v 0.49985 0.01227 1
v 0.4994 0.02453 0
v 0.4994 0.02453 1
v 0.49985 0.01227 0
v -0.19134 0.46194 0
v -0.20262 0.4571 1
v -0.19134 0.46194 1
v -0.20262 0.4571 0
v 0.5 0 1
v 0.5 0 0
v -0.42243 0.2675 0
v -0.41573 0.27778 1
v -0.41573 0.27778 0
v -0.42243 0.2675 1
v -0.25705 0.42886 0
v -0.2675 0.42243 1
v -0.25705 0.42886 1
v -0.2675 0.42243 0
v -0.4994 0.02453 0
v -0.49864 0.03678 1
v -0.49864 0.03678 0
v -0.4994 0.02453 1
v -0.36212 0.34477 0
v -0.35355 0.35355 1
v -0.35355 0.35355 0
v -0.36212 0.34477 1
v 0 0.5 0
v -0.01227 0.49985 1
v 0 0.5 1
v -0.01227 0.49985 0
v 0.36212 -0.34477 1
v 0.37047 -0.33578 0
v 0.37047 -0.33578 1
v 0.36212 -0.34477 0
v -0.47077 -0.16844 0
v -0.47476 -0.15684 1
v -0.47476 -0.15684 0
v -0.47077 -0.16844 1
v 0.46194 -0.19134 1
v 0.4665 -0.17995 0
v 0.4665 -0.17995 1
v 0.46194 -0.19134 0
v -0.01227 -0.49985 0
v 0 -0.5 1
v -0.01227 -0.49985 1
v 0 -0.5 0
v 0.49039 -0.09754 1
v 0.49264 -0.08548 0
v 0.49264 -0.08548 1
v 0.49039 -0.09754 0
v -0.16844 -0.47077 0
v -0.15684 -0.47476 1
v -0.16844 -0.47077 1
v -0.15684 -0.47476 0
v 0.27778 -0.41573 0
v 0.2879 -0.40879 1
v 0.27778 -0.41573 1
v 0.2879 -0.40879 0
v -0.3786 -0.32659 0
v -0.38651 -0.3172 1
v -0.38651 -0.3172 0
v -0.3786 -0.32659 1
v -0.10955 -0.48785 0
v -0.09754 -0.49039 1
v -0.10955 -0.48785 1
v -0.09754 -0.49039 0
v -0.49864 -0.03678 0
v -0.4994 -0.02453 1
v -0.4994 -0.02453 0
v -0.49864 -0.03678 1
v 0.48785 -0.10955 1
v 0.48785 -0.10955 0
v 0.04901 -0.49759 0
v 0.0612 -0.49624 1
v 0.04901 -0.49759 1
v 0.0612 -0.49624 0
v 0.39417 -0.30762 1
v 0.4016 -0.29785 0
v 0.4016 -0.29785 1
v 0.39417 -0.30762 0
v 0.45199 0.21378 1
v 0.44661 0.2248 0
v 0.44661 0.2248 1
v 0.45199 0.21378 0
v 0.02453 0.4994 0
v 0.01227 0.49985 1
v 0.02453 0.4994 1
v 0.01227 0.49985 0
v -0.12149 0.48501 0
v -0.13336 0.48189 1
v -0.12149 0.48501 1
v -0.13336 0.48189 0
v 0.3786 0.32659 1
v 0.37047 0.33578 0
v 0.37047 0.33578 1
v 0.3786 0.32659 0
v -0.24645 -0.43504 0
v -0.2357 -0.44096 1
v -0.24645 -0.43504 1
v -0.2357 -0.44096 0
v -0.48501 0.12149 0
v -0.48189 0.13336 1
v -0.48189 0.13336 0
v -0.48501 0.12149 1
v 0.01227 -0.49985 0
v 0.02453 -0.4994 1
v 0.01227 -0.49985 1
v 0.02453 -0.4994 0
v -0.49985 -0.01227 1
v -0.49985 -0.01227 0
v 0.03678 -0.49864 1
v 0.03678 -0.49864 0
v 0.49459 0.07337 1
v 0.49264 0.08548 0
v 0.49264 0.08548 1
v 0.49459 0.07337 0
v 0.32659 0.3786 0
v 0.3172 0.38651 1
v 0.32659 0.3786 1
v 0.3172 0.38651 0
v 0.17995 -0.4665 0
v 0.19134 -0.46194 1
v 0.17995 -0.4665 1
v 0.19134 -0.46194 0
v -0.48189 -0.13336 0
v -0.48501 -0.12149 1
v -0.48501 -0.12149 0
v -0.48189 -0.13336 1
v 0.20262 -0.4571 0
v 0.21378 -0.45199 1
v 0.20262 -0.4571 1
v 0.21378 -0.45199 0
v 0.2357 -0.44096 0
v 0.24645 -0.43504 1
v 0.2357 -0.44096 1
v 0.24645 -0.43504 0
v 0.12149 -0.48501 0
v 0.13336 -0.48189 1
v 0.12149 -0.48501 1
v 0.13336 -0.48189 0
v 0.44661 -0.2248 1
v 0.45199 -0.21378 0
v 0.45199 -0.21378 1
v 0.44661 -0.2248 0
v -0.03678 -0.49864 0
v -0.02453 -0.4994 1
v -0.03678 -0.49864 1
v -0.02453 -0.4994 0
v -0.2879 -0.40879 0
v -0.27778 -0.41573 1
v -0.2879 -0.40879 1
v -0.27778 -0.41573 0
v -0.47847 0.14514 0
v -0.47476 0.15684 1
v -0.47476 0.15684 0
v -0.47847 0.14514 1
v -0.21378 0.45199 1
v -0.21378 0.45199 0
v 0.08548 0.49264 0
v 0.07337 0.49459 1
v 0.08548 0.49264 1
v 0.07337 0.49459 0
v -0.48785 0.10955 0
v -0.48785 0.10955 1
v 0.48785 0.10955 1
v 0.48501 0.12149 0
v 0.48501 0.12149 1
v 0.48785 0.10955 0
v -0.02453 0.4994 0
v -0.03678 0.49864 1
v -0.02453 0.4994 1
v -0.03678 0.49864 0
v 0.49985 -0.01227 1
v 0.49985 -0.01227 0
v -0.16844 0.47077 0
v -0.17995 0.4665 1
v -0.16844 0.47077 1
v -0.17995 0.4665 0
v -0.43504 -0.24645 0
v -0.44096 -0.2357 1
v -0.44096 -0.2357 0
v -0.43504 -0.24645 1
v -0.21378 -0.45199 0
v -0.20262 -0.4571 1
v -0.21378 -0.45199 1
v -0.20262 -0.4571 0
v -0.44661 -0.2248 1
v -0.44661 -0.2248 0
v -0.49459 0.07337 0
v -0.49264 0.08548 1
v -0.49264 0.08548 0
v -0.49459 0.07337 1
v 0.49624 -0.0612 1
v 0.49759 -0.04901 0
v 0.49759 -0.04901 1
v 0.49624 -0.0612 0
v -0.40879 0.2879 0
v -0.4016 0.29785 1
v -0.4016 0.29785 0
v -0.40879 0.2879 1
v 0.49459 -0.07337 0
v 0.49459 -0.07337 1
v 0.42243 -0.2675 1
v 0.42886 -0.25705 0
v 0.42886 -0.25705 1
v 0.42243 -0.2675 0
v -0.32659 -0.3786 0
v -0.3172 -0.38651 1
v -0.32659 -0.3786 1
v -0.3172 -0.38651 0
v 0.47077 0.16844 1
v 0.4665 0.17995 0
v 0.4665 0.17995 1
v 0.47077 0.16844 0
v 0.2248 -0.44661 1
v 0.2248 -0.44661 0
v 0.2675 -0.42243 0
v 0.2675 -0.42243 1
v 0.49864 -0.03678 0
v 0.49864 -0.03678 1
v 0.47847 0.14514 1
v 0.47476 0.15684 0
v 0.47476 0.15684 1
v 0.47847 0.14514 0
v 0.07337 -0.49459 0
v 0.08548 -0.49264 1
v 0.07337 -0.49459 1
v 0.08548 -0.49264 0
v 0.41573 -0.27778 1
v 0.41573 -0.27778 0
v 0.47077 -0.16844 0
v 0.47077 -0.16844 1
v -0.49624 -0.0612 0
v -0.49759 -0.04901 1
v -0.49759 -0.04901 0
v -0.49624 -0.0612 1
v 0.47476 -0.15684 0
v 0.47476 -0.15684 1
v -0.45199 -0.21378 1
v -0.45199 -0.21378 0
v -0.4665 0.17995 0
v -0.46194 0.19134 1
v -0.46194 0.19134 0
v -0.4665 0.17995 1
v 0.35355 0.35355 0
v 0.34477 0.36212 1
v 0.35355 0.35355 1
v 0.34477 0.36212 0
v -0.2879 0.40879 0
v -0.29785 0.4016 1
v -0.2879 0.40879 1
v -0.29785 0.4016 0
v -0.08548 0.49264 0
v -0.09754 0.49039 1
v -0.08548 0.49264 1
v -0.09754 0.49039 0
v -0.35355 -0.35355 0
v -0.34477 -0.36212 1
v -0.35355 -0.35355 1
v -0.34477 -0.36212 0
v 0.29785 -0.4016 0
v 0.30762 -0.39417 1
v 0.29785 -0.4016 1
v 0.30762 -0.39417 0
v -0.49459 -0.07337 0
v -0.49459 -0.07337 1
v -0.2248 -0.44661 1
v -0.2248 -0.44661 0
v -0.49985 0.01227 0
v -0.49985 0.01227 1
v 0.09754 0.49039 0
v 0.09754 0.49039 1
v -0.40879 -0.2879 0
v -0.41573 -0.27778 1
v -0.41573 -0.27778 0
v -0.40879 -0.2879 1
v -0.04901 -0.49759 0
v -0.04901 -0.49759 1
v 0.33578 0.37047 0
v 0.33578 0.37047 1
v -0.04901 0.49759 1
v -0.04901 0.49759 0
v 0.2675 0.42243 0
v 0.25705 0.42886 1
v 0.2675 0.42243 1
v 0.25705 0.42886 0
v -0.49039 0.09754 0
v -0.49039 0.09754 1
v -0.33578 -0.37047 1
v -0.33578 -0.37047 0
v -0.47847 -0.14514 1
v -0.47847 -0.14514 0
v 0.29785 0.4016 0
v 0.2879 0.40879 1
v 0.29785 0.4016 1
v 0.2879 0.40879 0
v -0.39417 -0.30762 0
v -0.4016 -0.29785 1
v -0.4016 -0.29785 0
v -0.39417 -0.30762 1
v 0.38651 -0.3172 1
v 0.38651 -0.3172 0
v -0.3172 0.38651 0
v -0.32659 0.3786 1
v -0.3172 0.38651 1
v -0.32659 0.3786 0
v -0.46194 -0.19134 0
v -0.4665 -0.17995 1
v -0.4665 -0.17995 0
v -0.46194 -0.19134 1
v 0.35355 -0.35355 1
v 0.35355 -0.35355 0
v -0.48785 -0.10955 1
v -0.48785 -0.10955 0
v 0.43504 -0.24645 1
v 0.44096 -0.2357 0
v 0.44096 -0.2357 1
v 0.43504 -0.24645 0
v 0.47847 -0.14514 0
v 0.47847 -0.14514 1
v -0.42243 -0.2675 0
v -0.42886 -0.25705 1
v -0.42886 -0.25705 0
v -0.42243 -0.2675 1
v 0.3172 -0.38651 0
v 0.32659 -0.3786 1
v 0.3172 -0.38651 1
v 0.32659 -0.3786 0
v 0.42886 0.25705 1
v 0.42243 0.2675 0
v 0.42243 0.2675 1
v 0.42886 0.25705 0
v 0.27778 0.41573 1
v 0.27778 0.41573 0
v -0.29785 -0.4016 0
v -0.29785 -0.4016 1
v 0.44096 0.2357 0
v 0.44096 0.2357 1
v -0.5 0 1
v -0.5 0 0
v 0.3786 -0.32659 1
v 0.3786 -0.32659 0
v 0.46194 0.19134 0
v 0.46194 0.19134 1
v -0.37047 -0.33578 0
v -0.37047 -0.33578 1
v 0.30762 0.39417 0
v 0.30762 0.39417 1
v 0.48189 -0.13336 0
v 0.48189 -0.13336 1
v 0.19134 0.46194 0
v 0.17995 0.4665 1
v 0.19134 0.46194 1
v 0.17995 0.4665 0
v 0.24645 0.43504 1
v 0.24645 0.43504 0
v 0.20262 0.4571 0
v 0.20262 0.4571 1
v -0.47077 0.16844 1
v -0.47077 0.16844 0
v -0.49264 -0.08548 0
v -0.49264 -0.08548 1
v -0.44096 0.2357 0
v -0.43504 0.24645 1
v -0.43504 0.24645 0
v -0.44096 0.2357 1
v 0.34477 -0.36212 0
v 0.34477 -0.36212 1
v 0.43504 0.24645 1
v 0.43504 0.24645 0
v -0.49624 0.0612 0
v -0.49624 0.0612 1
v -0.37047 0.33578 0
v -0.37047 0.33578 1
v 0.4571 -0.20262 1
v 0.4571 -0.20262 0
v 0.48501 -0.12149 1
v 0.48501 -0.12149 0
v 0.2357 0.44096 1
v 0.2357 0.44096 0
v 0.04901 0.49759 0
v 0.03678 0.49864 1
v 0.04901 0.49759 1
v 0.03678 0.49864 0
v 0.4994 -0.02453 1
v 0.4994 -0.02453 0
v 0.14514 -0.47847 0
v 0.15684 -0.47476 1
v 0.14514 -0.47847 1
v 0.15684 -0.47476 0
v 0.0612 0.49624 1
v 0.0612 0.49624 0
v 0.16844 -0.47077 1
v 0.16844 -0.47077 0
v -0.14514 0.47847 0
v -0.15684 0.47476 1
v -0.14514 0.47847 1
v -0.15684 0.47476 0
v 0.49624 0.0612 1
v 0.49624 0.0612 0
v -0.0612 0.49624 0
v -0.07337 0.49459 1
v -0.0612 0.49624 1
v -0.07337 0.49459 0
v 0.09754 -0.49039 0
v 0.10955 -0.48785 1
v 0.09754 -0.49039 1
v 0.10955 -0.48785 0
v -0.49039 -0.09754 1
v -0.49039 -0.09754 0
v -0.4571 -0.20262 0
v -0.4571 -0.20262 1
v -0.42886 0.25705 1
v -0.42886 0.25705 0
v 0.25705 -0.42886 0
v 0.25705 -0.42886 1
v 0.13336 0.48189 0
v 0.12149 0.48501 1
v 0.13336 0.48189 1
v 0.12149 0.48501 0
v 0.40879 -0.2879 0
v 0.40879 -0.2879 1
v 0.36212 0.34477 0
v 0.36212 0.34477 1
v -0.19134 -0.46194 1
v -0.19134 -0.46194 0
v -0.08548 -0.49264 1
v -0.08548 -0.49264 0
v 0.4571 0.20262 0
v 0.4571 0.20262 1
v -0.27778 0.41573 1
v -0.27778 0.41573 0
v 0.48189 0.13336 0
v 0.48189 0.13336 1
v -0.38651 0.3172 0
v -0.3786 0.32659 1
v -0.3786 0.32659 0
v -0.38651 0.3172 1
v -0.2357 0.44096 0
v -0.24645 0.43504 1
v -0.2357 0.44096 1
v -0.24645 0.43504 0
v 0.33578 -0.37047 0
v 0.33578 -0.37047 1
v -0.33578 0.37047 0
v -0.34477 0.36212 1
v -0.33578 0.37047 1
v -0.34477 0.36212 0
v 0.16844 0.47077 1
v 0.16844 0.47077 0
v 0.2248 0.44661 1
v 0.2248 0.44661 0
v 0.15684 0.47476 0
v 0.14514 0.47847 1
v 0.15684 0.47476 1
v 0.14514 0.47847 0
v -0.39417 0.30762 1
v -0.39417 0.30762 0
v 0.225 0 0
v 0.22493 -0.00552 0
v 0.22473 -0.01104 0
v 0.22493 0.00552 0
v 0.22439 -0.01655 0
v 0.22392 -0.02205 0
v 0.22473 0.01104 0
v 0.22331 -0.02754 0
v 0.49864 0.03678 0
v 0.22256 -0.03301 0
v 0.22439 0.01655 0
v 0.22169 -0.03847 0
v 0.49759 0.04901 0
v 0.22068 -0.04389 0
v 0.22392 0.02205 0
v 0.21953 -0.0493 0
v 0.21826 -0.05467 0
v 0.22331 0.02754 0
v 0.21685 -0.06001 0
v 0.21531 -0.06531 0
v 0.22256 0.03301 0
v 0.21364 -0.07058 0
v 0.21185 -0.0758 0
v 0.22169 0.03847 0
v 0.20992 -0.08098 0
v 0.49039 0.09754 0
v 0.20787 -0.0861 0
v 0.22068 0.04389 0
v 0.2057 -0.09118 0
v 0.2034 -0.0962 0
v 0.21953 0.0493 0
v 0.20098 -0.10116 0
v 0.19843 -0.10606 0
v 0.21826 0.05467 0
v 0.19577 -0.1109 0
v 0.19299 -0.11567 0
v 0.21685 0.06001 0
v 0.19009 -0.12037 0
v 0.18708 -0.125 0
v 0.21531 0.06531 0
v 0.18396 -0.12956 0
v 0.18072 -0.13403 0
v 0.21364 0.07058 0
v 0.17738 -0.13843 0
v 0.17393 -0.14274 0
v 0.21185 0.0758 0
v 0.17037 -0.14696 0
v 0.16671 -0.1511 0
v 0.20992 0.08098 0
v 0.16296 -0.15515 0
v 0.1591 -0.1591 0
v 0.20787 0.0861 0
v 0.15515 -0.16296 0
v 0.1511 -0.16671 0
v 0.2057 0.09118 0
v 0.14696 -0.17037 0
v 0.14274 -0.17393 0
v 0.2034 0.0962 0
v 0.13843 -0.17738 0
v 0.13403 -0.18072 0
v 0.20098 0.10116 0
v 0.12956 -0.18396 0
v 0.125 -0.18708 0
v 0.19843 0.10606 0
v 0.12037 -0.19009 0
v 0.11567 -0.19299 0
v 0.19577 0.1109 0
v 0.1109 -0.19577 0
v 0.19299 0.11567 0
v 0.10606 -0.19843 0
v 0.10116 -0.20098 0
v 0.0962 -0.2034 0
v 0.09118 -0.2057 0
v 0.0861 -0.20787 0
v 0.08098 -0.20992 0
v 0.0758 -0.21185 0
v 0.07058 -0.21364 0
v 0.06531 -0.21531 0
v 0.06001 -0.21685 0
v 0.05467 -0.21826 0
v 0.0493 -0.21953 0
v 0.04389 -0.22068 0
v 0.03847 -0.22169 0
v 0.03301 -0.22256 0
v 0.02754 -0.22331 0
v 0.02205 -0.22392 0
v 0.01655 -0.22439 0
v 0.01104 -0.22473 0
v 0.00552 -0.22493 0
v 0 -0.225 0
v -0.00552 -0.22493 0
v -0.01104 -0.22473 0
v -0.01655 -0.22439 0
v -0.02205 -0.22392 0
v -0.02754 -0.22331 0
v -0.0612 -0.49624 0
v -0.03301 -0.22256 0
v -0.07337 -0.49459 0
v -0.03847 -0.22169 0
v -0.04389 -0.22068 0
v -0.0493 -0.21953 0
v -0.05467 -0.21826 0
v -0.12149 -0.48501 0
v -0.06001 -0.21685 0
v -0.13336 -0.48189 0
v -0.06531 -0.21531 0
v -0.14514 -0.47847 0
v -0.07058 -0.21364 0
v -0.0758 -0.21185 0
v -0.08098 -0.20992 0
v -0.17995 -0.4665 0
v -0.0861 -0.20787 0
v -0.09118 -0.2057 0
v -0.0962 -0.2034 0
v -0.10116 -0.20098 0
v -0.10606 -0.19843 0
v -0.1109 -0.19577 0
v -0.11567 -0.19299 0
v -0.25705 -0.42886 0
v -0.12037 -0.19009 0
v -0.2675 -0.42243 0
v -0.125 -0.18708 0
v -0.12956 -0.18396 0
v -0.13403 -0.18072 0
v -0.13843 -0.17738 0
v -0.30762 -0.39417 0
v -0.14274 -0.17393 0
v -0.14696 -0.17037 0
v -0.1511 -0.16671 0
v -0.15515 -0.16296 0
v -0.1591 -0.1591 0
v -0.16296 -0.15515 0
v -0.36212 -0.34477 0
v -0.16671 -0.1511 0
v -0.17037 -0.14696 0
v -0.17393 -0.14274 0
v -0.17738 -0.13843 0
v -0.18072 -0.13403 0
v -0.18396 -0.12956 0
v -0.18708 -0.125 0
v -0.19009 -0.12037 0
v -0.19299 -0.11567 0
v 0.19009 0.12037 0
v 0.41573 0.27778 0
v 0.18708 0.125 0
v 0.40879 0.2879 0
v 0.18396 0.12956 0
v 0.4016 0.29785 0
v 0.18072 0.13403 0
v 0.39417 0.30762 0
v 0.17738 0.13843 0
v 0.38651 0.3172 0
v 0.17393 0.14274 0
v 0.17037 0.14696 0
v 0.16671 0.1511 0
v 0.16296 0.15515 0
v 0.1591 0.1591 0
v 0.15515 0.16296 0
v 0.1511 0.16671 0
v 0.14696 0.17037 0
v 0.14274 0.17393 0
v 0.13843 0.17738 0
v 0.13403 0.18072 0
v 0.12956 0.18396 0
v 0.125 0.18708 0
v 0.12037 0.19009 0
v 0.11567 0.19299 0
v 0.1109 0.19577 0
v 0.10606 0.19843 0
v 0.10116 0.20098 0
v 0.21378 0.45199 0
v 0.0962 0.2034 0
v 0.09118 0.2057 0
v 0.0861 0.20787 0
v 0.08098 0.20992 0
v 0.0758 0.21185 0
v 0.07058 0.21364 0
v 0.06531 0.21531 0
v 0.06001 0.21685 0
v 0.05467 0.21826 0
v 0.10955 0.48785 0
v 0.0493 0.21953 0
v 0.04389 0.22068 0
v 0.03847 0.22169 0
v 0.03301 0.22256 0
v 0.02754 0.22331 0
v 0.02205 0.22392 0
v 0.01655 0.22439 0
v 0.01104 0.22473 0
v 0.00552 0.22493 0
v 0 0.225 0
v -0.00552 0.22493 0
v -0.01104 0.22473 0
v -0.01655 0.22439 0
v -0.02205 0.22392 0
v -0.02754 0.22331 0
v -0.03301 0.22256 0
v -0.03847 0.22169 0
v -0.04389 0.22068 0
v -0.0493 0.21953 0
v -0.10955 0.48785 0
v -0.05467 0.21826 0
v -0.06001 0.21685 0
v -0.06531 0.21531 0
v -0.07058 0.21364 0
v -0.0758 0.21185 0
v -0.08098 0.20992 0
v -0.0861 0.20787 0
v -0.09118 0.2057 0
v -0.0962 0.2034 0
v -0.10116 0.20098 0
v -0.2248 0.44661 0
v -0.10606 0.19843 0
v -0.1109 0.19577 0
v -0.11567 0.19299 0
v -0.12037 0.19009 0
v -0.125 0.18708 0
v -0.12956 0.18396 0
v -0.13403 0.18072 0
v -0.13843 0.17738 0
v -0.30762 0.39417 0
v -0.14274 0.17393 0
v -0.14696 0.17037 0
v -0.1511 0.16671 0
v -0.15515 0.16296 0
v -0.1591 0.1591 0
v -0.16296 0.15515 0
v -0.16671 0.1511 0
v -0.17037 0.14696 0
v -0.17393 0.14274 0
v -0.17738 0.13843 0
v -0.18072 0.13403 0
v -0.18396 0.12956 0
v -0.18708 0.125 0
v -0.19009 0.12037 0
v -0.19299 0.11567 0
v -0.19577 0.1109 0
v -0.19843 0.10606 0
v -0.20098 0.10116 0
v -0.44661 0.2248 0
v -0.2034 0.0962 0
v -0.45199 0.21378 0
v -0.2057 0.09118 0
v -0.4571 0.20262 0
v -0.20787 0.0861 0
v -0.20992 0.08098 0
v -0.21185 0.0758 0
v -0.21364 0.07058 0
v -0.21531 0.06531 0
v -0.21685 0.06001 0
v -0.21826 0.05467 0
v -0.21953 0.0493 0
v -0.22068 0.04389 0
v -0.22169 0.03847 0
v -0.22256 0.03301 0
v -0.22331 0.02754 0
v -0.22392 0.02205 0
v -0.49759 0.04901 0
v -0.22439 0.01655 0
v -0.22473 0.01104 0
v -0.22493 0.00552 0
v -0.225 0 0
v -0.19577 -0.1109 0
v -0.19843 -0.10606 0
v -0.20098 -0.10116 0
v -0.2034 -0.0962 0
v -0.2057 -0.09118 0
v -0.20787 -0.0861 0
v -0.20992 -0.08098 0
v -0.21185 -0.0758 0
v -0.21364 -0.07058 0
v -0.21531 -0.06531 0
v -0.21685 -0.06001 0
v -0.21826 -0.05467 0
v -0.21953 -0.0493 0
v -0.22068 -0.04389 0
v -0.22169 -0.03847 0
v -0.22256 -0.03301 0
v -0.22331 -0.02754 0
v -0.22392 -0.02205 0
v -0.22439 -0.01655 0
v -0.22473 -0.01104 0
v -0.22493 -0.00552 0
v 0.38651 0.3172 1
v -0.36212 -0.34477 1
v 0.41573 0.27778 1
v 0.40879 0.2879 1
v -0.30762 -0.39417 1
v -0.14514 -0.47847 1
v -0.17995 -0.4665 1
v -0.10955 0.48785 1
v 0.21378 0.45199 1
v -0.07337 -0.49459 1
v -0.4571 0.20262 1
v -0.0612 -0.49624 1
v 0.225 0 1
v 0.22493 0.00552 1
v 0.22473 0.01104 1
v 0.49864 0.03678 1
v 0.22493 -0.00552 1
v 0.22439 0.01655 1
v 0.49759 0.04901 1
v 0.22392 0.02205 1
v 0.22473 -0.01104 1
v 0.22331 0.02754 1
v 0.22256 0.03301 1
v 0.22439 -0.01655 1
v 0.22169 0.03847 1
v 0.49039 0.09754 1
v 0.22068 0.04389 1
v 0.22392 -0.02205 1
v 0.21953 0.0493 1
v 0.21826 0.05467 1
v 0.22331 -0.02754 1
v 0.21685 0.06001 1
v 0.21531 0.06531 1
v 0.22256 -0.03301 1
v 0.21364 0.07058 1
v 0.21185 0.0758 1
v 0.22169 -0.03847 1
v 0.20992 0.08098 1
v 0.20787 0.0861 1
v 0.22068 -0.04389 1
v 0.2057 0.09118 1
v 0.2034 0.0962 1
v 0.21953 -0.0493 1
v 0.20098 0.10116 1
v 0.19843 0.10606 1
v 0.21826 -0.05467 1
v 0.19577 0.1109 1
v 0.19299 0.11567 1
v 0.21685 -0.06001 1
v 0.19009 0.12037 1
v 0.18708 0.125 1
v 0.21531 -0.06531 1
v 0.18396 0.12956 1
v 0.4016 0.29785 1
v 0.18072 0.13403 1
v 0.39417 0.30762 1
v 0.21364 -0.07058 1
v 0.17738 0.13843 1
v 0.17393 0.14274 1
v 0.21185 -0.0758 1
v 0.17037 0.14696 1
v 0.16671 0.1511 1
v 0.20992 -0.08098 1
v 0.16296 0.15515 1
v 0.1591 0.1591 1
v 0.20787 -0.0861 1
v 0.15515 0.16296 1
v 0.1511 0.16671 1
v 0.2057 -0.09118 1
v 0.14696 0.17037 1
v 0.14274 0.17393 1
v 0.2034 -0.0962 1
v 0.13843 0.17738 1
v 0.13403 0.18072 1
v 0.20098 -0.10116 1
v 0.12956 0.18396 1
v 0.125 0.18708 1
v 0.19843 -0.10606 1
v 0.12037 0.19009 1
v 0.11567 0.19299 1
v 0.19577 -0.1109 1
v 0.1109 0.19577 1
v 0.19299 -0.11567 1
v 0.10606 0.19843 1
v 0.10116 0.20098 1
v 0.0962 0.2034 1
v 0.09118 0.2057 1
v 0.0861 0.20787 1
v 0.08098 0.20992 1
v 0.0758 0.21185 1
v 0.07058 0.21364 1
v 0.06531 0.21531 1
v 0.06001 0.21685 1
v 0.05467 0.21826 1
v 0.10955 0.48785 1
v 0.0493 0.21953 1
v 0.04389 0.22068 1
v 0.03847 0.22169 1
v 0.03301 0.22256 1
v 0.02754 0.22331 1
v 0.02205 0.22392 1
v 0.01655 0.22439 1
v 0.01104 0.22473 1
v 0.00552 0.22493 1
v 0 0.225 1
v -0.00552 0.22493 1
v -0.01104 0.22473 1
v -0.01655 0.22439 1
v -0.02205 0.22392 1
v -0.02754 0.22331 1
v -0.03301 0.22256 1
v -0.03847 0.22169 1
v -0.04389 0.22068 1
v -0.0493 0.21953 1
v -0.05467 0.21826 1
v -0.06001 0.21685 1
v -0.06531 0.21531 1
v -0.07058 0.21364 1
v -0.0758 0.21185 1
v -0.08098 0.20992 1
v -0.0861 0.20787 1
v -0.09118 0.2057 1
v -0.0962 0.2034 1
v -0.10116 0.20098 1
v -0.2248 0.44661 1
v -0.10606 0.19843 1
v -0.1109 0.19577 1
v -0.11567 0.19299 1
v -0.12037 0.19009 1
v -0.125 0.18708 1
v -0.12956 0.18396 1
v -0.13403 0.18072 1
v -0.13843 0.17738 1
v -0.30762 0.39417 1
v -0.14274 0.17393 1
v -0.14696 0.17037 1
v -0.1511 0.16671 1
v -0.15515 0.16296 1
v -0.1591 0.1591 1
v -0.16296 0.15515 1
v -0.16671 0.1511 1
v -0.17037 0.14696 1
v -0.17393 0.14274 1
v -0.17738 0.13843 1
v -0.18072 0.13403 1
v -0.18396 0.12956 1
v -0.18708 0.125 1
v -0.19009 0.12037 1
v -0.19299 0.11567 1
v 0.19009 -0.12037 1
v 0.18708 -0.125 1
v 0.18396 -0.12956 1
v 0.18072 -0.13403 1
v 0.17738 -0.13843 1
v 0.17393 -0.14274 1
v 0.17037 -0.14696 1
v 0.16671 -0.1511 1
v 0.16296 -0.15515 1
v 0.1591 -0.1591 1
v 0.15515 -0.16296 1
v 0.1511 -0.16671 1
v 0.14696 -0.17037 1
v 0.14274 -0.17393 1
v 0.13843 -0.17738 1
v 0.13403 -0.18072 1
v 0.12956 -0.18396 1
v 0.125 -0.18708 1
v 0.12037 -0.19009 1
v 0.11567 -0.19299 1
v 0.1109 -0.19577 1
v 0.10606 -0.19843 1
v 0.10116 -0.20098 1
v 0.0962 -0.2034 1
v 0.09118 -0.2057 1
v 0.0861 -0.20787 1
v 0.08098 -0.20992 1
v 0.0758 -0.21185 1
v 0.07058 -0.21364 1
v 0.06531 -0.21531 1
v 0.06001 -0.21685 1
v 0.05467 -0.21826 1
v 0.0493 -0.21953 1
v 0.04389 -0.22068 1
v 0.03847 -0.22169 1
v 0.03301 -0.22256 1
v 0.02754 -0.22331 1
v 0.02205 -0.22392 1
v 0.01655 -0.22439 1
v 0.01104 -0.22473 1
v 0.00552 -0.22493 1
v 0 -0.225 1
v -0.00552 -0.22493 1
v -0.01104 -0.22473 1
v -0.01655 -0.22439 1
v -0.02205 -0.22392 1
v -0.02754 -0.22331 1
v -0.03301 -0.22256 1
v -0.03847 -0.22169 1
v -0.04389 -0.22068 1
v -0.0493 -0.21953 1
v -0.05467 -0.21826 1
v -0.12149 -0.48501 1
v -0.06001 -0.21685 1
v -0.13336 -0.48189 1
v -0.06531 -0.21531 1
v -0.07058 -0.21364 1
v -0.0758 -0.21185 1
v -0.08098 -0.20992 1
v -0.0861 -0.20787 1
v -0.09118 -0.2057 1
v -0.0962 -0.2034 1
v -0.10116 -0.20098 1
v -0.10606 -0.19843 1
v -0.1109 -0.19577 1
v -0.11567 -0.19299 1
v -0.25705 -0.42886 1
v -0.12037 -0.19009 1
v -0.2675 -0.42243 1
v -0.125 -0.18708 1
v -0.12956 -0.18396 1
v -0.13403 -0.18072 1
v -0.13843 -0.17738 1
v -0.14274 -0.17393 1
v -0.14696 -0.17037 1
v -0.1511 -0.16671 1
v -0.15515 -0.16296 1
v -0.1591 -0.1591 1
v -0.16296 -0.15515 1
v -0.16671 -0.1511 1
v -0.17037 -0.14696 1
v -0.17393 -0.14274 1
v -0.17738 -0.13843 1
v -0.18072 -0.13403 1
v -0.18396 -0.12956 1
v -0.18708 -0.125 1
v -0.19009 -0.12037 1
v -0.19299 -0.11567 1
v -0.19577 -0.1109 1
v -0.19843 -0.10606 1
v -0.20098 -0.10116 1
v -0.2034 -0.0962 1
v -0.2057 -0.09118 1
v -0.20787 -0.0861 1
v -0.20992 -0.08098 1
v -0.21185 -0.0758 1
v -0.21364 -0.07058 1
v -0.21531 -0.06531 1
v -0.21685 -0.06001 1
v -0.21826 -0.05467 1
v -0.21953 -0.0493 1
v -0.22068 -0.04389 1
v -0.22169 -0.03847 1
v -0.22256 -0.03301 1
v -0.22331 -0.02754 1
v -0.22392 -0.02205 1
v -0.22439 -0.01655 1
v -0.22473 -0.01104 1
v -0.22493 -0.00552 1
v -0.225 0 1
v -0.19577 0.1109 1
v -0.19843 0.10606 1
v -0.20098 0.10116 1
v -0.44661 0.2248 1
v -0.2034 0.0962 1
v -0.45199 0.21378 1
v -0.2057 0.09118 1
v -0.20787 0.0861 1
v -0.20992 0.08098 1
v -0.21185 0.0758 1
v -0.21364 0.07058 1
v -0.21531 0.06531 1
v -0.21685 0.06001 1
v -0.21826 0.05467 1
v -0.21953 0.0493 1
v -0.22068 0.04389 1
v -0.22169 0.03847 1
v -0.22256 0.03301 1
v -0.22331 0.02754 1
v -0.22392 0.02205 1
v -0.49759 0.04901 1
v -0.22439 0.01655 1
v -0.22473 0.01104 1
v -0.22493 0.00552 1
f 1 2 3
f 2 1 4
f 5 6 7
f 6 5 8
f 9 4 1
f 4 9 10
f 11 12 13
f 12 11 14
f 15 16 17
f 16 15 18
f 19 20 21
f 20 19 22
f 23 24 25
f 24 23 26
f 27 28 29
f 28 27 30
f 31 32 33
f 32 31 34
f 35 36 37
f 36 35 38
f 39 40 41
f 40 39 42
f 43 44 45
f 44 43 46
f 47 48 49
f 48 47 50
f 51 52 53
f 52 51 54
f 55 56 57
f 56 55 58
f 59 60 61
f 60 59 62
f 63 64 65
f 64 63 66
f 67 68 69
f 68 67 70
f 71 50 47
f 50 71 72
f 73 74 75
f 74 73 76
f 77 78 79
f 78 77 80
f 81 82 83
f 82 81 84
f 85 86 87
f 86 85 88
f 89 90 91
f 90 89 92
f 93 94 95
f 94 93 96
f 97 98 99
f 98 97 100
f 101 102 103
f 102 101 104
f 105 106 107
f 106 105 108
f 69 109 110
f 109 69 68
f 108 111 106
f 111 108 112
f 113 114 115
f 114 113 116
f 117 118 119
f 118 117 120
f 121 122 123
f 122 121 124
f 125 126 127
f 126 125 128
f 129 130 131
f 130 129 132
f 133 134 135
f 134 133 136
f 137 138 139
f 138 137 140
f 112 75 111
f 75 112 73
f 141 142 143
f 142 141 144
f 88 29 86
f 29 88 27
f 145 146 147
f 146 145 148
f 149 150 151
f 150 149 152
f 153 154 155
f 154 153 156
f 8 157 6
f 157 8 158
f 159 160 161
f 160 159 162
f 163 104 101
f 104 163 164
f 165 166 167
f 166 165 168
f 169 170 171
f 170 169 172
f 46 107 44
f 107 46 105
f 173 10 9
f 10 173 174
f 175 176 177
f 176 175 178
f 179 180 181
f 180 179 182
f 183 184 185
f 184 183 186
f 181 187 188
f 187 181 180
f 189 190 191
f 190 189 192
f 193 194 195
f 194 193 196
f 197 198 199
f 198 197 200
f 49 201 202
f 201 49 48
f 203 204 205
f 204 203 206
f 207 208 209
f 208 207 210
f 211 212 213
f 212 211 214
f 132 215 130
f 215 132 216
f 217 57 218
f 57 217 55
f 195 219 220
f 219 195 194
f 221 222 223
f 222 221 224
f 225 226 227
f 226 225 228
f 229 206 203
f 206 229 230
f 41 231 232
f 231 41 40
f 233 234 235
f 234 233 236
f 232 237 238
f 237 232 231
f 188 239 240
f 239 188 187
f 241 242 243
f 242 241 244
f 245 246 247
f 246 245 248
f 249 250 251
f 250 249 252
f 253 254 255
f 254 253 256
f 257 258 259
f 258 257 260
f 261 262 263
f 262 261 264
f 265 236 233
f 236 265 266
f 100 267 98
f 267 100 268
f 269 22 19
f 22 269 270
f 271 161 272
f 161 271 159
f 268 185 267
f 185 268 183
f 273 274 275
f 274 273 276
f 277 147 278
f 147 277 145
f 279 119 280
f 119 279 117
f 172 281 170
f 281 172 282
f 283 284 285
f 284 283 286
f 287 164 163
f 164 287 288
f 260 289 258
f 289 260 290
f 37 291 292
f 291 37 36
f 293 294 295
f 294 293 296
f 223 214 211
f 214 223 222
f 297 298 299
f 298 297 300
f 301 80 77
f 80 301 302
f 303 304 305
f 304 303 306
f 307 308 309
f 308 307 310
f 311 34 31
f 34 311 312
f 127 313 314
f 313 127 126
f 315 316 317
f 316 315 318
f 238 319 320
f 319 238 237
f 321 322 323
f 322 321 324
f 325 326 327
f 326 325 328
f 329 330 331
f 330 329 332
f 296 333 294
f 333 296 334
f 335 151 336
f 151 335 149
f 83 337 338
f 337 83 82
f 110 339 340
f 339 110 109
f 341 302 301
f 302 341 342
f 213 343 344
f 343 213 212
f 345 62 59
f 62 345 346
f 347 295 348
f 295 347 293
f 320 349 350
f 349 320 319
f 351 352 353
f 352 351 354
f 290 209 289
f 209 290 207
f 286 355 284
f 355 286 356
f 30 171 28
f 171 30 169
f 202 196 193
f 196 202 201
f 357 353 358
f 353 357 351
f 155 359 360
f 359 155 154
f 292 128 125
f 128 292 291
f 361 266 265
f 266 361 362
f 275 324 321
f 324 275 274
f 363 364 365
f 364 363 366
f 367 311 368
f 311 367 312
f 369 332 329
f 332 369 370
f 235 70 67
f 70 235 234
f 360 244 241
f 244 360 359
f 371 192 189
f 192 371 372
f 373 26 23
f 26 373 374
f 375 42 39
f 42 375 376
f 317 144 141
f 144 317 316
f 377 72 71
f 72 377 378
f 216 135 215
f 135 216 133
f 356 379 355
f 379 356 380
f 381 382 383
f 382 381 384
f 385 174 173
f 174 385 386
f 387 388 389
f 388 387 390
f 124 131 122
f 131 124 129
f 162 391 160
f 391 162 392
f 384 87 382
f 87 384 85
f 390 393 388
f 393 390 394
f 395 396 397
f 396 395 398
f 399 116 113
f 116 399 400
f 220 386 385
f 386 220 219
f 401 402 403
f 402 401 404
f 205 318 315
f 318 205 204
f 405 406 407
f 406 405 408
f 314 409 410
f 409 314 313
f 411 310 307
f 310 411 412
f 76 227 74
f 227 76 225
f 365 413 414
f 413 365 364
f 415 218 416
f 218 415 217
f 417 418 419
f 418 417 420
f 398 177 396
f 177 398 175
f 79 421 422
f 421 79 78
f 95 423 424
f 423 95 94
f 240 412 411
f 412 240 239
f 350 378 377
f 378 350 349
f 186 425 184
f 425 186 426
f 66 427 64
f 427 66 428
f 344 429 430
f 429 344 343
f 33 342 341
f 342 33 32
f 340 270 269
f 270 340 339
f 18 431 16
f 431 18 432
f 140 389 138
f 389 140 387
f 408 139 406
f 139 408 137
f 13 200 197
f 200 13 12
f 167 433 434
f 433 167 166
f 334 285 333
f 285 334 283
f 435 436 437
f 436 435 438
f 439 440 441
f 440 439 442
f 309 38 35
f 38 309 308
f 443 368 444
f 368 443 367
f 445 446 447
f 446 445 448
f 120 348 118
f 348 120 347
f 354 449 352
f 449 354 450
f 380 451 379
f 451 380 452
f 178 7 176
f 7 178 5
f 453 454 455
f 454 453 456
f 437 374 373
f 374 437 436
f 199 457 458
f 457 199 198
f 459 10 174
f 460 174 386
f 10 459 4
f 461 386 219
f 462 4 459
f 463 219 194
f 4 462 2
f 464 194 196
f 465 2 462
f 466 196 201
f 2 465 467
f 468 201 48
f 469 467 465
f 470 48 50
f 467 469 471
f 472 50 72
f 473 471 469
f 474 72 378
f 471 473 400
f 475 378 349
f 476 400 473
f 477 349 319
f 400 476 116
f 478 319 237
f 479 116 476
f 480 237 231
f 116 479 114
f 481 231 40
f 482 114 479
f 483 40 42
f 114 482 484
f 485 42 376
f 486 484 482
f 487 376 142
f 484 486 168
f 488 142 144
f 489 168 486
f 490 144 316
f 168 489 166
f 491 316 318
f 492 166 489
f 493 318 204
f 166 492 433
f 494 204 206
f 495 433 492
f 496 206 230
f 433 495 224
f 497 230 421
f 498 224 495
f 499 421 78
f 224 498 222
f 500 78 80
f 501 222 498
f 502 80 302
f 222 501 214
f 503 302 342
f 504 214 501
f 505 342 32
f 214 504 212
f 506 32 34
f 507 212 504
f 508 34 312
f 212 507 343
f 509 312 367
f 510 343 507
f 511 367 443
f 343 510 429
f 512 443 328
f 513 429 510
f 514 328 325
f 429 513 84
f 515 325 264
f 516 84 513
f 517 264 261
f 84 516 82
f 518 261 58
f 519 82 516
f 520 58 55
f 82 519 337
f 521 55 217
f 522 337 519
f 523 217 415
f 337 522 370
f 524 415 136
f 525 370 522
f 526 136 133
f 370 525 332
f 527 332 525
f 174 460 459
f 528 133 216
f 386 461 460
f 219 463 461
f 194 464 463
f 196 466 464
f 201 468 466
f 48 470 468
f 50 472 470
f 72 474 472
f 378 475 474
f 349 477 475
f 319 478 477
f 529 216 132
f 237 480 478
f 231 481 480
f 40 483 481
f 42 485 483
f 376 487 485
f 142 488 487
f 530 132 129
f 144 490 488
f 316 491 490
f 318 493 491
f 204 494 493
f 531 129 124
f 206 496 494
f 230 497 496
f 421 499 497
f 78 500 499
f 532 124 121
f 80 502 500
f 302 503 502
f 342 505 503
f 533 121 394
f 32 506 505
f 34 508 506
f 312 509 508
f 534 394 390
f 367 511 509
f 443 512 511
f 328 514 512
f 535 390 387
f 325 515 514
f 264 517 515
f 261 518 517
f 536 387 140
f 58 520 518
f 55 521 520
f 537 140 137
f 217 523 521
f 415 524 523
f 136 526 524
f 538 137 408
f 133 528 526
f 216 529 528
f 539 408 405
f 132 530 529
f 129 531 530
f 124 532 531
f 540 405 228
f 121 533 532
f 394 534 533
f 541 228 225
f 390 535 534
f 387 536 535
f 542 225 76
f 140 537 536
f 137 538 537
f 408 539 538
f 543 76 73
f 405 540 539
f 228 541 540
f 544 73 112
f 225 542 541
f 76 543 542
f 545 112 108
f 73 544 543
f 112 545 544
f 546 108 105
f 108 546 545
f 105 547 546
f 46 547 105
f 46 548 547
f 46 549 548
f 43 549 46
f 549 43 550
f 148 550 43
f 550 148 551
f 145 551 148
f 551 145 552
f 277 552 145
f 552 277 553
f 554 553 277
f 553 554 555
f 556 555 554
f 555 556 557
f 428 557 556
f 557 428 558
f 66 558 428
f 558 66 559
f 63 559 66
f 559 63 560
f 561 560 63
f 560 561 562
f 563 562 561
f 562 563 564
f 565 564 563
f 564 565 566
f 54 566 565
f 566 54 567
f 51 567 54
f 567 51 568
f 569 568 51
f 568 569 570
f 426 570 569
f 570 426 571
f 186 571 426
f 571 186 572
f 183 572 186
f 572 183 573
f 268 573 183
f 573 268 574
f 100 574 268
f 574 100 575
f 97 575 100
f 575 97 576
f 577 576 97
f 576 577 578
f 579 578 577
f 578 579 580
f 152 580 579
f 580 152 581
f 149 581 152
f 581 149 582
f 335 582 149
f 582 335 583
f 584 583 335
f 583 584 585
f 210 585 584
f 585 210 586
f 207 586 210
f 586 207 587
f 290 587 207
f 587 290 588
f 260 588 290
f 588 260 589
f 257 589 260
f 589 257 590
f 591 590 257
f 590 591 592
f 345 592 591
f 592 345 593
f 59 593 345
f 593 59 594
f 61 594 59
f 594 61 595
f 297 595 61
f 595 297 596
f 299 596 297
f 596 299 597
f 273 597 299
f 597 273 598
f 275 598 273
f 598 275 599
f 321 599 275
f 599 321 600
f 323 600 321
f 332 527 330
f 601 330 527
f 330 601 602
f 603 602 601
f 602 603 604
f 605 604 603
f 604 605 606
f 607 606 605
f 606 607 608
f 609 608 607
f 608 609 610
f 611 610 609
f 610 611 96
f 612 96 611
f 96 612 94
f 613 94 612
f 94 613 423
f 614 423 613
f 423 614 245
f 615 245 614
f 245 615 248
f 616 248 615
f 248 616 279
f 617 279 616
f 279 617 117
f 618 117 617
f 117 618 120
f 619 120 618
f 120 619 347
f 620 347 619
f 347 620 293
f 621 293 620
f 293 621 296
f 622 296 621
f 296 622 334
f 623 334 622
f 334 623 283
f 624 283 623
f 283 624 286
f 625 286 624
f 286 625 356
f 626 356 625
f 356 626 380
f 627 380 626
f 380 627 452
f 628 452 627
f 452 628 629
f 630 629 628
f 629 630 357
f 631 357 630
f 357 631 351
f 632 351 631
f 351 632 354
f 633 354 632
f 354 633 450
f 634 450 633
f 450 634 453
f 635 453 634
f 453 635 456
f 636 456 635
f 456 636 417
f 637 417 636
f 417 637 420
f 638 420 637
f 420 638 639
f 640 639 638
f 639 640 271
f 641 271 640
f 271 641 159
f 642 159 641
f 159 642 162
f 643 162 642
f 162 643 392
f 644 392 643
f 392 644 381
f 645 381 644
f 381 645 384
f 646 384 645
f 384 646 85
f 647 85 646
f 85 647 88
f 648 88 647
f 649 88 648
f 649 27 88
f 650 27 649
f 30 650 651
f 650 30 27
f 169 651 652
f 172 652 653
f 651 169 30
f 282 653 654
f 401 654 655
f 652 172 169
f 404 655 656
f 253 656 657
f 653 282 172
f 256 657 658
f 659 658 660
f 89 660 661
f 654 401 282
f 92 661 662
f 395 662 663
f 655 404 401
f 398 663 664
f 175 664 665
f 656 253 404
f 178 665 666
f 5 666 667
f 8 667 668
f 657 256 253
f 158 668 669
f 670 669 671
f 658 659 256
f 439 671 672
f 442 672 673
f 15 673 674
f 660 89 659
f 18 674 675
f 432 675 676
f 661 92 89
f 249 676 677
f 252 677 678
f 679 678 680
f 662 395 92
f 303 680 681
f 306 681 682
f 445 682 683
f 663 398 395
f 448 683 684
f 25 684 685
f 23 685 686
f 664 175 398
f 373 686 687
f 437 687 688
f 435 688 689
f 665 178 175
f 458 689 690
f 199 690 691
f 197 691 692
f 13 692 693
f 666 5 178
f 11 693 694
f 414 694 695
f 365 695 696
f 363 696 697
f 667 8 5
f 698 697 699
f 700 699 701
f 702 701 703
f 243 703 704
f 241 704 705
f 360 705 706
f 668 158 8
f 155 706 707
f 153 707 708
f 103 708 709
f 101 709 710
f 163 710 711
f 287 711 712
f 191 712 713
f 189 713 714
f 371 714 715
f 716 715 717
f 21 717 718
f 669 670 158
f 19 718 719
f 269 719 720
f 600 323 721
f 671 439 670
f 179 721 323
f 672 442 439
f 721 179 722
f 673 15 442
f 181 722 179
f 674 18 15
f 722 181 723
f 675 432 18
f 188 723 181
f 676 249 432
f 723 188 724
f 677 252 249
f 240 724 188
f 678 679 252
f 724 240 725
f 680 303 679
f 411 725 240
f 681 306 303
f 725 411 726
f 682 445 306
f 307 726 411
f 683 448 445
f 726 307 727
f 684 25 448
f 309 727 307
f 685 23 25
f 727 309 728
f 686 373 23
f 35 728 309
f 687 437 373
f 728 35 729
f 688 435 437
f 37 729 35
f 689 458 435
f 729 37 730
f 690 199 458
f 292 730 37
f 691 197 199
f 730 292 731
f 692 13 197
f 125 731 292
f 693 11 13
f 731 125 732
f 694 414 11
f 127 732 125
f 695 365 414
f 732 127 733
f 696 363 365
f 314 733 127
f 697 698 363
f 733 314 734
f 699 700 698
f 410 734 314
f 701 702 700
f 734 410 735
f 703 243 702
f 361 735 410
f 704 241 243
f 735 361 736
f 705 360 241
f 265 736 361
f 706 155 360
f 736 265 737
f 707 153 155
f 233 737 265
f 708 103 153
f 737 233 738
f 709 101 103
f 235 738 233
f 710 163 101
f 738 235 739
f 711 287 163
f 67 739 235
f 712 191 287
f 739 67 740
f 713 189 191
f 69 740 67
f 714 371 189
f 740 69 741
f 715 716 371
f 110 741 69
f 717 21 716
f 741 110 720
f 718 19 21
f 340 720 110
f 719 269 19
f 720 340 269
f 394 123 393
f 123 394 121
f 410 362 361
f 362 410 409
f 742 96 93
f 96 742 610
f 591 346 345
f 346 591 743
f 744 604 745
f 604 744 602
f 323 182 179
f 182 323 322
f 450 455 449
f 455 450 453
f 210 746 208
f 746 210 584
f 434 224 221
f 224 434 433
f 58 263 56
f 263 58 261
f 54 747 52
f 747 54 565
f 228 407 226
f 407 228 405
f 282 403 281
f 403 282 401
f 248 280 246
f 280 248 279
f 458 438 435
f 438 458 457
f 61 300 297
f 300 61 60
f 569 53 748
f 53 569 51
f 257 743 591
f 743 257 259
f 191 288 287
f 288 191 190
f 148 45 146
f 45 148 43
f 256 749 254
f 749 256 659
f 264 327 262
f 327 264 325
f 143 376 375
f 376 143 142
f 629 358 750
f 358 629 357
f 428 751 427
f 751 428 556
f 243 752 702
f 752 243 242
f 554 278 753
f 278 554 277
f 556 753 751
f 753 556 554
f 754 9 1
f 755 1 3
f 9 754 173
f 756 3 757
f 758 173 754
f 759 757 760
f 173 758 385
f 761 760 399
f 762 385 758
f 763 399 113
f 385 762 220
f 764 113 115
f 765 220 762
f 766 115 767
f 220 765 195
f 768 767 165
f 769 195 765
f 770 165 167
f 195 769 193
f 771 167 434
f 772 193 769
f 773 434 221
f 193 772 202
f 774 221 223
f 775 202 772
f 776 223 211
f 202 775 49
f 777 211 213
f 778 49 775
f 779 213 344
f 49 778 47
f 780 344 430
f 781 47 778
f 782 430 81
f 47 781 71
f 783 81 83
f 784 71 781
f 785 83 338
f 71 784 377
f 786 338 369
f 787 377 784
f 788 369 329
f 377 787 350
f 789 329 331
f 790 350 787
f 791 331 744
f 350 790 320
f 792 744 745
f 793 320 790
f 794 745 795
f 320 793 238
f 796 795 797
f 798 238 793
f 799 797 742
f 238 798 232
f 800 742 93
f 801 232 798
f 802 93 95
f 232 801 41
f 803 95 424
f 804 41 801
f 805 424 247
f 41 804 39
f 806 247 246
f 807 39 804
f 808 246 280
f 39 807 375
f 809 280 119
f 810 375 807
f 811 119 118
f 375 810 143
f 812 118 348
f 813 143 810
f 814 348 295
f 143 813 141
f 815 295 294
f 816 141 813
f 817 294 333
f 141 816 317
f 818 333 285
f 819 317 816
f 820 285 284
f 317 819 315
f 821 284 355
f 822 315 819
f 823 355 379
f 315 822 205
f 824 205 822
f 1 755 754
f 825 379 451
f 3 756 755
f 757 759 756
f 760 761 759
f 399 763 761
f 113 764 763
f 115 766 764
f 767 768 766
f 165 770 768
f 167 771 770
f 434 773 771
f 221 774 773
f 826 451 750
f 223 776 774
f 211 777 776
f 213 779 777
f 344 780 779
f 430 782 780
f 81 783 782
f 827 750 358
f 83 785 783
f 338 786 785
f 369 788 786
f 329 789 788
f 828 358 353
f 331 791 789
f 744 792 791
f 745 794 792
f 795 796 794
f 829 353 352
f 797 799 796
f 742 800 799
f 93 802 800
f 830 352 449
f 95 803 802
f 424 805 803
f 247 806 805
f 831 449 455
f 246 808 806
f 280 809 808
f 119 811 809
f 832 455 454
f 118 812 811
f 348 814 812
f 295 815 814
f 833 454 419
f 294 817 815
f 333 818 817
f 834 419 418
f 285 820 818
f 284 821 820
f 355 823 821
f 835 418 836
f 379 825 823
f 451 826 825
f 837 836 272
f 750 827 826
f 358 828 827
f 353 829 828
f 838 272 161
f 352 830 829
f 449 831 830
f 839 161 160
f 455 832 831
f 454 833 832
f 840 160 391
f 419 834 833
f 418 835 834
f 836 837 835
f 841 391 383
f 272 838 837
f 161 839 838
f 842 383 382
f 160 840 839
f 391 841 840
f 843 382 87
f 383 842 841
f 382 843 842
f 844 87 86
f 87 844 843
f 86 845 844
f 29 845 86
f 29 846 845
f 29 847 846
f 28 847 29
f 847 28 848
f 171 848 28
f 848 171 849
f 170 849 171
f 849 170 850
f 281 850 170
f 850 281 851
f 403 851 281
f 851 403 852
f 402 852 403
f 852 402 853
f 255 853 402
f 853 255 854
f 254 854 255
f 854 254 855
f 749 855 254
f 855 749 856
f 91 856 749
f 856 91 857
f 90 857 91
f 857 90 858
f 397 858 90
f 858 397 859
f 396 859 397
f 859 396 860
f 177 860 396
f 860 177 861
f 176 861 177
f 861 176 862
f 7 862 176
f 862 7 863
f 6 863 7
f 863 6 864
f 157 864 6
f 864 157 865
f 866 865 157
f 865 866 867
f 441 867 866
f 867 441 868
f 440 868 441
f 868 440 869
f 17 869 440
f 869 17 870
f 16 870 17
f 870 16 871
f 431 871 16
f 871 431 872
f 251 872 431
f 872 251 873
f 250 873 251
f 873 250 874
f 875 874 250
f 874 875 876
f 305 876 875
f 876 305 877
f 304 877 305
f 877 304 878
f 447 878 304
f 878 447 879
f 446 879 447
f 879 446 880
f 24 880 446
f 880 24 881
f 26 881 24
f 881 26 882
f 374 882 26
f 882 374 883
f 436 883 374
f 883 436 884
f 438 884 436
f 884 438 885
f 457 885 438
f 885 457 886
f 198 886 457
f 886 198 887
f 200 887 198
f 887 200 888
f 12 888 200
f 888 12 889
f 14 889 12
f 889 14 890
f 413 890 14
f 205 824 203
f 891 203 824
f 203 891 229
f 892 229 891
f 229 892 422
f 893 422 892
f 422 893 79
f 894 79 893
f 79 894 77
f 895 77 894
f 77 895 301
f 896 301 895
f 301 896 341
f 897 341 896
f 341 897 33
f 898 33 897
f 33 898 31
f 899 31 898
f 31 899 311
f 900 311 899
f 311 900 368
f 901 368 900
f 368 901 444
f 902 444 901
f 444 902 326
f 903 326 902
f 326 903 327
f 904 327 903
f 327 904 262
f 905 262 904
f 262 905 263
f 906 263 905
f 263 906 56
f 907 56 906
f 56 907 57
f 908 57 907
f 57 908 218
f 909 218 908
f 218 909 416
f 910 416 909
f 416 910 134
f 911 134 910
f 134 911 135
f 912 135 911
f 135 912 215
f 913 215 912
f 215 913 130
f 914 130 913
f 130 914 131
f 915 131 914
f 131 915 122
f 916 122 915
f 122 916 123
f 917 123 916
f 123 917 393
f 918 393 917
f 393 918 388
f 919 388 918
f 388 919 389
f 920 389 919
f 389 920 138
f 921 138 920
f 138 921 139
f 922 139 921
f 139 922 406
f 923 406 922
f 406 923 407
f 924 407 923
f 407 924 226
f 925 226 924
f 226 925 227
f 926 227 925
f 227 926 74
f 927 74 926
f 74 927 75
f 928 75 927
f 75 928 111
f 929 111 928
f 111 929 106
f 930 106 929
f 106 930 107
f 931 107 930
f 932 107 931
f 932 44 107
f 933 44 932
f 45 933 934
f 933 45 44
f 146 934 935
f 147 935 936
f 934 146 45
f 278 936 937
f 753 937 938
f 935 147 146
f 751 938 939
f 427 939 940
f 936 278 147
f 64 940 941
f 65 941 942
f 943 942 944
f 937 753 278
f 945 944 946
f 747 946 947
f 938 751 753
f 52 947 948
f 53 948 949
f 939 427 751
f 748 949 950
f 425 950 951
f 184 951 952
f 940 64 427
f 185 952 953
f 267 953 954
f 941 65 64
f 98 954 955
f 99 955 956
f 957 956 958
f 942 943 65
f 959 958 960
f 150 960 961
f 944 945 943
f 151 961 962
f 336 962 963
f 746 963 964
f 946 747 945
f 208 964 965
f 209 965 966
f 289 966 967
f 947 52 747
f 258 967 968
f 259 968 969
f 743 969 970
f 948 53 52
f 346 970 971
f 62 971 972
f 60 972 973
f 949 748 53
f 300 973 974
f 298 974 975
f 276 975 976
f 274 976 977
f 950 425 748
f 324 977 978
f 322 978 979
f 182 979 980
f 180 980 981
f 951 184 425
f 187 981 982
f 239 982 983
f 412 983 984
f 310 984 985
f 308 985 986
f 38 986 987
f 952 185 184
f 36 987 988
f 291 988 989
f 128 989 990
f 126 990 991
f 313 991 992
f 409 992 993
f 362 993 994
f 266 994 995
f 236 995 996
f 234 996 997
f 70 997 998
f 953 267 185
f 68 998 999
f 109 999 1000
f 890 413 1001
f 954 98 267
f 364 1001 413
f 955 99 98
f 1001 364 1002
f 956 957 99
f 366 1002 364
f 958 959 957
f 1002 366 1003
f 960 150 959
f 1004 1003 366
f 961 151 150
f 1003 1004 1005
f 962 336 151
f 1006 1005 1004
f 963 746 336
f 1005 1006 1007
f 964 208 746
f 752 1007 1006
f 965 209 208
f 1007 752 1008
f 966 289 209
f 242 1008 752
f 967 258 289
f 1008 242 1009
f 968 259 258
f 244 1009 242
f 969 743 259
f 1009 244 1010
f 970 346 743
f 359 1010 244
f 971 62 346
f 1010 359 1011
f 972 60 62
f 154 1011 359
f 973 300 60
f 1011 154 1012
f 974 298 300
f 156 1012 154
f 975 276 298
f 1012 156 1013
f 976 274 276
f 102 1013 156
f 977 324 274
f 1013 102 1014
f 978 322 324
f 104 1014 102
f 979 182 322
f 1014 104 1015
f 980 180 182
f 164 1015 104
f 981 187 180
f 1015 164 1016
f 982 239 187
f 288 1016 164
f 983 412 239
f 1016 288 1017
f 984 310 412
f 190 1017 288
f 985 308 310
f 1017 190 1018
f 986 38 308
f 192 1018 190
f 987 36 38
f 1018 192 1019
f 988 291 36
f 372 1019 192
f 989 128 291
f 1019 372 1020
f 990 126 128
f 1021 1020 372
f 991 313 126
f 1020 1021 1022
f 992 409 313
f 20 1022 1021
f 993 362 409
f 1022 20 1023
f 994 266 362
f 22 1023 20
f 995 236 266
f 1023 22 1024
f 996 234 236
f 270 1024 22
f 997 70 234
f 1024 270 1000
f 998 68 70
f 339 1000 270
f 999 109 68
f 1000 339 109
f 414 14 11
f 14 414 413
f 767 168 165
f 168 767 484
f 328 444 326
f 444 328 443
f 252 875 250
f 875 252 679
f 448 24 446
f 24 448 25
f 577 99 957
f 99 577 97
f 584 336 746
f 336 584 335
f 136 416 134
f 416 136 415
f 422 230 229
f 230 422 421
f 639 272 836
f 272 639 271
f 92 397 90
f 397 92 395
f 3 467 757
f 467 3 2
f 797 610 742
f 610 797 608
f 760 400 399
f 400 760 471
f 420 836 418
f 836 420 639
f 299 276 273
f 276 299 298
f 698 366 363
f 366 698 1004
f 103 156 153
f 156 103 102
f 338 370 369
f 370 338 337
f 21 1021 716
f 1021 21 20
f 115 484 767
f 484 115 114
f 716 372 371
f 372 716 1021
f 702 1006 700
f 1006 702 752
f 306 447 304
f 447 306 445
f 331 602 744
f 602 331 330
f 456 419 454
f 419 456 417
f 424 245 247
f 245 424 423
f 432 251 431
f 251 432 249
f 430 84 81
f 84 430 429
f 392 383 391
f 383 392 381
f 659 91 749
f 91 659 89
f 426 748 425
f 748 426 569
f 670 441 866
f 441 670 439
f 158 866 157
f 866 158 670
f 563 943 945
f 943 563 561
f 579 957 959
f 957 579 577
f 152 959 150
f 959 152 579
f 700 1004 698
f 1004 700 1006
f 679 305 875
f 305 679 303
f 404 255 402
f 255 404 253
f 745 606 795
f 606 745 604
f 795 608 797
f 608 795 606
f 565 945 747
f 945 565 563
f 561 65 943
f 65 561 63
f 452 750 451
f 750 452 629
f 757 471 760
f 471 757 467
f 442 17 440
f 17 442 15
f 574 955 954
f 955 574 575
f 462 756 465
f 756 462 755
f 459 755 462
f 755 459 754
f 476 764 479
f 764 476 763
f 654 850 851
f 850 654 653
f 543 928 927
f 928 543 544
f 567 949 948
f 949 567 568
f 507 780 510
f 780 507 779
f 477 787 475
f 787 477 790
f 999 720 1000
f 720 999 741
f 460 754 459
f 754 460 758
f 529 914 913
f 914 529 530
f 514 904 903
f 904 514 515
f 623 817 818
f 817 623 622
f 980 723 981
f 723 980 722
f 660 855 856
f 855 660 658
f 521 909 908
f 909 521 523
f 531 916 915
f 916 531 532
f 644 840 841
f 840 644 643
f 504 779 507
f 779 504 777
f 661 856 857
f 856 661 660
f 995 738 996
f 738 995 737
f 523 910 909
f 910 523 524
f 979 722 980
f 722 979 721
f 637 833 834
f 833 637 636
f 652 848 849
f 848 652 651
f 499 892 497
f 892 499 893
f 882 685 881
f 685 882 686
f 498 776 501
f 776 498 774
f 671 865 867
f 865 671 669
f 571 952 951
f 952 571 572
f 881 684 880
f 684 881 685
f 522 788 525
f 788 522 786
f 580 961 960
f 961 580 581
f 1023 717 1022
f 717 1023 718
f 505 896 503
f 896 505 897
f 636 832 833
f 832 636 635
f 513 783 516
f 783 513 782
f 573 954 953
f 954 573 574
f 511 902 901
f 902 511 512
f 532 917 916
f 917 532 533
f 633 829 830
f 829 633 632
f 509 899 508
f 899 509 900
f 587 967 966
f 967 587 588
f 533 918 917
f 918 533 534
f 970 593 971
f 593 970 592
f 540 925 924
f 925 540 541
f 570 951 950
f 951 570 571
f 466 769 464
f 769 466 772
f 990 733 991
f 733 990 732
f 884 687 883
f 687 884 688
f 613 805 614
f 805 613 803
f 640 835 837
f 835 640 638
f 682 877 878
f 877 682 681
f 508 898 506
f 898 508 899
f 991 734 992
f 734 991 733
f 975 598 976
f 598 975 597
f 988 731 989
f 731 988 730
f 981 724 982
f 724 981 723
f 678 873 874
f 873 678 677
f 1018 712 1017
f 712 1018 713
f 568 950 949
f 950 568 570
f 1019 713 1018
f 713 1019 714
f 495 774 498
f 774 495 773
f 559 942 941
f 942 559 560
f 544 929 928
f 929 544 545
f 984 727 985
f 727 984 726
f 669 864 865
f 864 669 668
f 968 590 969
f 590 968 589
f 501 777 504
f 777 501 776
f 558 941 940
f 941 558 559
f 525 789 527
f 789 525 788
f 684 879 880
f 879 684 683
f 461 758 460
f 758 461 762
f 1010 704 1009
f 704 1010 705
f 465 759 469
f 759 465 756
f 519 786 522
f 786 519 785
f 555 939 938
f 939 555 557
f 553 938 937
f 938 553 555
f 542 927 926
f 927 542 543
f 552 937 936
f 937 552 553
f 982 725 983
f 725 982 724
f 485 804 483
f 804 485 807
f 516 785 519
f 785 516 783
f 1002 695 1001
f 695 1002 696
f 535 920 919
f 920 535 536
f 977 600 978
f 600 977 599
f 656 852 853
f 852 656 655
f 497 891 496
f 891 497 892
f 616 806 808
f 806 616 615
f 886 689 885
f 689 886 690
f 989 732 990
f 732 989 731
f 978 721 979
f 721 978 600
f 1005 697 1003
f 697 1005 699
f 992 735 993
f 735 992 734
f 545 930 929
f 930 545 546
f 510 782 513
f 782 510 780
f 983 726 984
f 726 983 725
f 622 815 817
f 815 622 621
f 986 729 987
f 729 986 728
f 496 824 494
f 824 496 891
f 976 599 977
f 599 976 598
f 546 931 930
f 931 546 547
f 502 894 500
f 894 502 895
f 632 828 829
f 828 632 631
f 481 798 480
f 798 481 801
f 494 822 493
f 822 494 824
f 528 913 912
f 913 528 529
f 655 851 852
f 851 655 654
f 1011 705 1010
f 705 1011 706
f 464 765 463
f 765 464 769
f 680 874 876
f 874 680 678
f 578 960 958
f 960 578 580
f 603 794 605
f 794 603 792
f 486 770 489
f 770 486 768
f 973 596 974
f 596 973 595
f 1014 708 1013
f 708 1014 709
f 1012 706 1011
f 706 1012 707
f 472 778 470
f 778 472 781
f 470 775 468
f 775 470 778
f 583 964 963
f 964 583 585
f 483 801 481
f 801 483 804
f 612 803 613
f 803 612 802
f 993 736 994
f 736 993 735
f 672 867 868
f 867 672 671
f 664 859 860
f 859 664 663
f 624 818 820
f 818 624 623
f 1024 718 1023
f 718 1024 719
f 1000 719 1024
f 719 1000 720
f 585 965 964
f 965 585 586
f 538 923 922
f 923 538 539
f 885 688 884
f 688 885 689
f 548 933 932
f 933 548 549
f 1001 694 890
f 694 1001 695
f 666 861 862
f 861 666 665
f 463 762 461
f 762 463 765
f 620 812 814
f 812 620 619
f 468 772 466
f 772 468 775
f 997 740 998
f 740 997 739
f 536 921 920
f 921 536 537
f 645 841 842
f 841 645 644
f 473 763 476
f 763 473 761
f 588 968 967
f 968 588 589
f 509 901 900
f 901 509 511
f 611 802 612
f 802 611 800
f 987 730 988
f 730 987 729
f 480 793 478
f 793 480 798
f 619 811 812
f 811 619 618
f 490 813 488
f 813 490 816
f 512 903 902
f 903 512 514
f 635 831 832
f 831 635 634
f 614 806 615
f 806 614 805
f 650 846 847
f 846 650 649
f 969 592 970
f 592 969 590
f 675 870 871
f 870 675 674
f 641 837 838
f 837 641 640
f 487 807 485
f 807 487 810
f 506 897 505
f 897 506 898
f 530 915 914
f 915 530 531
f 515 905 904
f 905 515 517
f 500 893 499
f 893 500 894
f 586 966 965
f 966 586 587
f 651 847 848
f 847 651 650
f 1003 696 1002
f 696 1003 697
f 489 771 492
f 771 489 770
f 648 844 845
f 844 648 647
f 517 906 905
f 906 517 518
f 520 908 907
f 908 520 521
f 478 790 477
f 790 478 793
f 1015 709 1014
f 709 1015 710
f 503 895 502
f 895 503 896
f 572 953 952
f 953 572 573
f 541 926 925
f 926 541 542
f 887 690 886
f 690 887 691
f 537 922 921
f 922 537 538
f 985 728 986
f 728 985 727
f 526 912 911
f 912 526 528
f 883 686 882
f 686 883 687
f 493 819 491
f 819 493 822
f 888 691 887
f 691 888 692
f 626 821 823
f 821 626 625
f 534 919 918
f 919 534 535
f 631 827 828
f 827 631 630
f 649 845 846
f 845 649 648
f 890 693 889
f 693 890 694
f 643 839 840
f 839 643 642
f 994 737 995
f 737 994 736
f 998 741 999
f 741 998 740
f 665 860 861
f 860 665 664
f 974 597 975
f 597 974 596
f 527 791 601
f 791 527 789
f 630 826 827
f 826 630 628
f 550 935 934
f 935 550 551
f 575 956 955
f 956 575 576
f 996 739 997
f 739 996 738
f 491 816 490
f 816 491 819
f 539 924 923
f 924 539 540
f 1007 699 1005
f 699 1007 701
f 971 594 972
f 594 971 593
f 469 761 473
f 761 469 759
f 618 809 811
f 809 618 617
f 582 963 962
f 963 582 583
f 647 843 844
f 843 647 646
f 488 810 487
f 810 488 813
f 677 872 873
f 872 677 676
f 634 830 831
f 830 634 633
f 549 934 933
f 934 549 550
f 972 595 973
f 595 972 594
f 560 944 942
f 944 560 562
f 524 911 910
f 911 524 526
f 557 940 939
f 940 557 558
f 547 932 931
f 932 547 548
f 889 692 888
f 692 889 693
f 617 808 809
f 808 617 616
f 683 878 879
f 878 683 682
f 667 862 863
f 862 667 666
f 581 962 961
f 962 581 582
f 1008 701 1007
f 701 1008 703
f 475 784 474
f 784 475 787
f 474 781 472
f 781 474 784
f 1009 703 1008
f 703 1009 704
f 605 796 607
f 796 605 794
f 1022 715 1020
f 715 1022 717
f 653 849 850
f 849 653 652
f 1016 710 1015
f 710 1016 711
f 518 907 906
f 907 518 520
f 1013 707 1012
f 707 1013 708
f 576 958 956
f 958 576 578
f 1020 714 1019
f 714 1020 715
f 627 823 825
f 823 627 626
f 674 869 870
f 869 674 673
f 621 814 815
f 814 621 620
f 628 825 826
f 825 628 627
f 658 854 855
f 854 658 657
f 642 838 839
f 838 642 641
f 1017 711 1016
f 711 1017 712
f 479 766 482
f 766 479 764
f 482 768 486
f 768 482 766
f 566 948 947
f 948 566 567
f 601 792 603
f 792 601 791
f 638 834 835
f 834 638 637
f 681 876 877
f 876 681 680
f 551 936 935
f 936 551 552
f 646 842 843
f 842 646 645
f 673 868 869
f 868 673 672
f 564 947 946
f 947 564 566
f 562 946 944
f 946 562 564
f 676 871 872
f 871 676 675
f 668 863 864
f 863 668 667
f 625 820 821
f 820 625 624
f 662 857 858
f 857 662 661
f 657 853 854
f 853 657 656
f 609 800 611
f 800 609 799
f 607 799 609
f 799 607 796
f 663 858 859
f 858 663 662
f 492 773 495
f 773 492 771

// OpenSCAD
// Tube (Thick) for Basic Shapes
// by Slashee the Cow
$fn = 256;

difference(){
    linear_extrude(1)
        circle(d=1);
    linear_extrude(1)
        circle(d=0.45);
}
